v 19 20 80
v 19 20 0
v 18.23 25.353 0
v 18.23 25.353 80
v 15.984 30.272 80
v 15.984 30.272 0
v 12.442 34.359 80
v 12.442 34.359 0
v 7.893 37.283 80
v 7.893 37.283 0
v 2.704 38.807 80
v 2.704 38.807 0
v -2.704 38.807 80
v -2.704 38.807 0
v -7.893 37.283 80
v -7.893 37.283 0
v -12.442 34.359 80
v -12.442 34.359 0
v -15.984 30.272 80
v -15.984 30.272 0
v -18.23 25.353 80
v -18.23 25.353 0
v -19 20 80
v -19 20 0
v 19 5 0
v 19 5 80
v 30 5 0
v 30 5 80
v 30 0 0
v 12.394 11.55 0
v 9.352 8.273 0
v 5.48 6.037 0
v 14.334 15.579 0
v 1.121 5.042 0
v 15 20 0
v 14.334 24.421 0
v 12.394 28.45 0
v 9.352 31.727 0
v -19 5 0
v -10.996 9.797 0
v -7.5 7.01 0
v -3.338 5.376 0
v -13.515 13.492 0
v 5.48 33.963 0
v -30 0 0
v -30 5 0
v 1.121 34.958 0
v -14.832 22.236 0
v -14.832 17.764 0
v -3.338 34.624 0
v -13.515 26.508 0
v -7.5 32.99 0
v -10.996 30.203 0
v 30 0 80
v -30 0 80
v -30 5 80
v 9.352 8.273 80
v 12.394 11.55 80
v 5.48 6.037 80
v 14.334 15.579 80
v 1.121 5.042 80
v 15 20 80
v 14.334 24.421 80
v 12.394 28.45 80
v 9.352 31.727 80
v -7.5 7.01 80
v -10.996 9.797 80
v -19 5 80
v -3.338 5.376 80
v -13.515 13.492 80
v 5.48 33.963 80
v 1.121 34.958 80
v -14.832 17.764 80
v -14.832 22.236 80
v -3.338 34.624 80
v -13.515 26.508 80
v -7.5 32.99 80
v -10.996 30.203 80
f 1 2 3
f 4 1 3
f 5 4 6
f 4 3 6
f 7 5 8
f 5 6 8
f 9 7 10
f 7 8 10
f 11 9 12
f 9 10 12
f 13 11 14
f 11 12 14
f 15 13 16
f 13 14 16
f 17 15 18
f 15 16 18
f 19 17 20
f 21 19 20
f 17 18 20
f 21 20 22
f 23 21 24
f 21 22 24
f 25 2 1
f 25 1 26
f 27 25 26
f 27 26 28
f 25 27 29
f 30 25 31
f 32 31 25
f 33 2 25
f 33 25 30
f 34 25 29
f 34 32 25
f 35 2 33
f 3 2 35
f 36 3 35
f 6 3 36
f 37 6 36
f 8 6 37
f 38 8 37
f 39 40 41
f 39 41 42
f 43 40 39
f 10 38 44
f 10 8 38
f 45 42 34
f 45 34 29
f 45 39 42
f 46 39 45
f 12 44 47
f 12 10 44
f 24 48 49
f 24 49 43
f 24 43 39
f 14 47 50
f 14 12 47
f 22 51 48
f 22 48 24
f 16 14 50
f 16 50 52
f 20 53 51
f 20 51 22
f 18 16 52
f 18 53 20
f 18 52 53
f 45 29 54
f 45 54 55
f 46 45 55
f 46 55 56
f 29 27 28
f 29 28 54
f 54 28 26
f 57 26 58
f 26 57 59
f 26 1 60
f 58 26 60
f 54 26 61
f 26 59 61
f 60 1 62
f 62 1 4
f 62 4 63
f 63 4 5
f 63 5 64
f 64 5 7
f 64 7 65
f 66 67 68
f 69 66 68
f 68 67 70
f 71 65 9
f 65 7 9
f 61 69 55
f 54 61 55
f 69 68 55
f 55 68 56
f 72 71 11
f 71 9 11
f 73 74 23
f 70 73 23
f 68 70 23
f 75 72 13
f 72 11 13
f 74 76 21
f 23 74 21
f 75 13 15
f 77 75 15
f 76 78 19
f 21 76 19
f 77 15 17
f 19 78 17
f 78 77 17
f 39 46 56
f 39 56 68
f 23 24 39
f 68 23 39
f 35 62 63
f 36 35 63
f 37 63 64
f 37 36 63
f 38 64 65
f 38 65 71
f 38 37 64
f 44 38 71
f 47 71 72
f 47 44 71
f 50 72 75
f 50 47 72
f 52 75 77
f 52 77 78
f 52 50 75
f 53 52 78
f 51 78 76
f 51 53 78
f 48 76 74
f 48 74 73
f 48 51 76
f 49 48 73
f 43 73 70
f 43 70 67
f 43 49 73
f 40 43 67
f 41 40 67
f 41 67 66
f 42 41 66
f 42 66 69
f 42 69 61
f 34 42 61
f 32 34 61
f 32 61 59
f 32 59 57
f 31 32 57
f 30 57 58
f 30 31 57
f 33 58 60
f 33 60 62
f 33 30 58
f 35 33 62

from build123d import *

# Parameters (mm, degrees)
SKETCH_R  = 15
PAD_DEPTH = 80


with BuildPart() as part:
    # Sketch → Pad (new body)
    with BuildSketch(Plane.XY):
        with BuildLine():
            Line((30, 5), (30, 0))
            Line((30, 0), (-30, 0))
            Line((-30, 0), (-30, 5))
            Line((-30, 5), (-19, 5))
            Line((-19, 20), (-19, 5))
            ThreePointArc((19, 20), (0, 39), (-19, 20))
            Line((19, 20), (19, 5))
            Line((19, 5), (30, 5))
        make_face()
        with Locations((0, 20)):
            Circle(SKETCH_R, mode=Mode.SUBTRACT)
    extrude(amount=PAD_DEPTH)


solid = part.part
